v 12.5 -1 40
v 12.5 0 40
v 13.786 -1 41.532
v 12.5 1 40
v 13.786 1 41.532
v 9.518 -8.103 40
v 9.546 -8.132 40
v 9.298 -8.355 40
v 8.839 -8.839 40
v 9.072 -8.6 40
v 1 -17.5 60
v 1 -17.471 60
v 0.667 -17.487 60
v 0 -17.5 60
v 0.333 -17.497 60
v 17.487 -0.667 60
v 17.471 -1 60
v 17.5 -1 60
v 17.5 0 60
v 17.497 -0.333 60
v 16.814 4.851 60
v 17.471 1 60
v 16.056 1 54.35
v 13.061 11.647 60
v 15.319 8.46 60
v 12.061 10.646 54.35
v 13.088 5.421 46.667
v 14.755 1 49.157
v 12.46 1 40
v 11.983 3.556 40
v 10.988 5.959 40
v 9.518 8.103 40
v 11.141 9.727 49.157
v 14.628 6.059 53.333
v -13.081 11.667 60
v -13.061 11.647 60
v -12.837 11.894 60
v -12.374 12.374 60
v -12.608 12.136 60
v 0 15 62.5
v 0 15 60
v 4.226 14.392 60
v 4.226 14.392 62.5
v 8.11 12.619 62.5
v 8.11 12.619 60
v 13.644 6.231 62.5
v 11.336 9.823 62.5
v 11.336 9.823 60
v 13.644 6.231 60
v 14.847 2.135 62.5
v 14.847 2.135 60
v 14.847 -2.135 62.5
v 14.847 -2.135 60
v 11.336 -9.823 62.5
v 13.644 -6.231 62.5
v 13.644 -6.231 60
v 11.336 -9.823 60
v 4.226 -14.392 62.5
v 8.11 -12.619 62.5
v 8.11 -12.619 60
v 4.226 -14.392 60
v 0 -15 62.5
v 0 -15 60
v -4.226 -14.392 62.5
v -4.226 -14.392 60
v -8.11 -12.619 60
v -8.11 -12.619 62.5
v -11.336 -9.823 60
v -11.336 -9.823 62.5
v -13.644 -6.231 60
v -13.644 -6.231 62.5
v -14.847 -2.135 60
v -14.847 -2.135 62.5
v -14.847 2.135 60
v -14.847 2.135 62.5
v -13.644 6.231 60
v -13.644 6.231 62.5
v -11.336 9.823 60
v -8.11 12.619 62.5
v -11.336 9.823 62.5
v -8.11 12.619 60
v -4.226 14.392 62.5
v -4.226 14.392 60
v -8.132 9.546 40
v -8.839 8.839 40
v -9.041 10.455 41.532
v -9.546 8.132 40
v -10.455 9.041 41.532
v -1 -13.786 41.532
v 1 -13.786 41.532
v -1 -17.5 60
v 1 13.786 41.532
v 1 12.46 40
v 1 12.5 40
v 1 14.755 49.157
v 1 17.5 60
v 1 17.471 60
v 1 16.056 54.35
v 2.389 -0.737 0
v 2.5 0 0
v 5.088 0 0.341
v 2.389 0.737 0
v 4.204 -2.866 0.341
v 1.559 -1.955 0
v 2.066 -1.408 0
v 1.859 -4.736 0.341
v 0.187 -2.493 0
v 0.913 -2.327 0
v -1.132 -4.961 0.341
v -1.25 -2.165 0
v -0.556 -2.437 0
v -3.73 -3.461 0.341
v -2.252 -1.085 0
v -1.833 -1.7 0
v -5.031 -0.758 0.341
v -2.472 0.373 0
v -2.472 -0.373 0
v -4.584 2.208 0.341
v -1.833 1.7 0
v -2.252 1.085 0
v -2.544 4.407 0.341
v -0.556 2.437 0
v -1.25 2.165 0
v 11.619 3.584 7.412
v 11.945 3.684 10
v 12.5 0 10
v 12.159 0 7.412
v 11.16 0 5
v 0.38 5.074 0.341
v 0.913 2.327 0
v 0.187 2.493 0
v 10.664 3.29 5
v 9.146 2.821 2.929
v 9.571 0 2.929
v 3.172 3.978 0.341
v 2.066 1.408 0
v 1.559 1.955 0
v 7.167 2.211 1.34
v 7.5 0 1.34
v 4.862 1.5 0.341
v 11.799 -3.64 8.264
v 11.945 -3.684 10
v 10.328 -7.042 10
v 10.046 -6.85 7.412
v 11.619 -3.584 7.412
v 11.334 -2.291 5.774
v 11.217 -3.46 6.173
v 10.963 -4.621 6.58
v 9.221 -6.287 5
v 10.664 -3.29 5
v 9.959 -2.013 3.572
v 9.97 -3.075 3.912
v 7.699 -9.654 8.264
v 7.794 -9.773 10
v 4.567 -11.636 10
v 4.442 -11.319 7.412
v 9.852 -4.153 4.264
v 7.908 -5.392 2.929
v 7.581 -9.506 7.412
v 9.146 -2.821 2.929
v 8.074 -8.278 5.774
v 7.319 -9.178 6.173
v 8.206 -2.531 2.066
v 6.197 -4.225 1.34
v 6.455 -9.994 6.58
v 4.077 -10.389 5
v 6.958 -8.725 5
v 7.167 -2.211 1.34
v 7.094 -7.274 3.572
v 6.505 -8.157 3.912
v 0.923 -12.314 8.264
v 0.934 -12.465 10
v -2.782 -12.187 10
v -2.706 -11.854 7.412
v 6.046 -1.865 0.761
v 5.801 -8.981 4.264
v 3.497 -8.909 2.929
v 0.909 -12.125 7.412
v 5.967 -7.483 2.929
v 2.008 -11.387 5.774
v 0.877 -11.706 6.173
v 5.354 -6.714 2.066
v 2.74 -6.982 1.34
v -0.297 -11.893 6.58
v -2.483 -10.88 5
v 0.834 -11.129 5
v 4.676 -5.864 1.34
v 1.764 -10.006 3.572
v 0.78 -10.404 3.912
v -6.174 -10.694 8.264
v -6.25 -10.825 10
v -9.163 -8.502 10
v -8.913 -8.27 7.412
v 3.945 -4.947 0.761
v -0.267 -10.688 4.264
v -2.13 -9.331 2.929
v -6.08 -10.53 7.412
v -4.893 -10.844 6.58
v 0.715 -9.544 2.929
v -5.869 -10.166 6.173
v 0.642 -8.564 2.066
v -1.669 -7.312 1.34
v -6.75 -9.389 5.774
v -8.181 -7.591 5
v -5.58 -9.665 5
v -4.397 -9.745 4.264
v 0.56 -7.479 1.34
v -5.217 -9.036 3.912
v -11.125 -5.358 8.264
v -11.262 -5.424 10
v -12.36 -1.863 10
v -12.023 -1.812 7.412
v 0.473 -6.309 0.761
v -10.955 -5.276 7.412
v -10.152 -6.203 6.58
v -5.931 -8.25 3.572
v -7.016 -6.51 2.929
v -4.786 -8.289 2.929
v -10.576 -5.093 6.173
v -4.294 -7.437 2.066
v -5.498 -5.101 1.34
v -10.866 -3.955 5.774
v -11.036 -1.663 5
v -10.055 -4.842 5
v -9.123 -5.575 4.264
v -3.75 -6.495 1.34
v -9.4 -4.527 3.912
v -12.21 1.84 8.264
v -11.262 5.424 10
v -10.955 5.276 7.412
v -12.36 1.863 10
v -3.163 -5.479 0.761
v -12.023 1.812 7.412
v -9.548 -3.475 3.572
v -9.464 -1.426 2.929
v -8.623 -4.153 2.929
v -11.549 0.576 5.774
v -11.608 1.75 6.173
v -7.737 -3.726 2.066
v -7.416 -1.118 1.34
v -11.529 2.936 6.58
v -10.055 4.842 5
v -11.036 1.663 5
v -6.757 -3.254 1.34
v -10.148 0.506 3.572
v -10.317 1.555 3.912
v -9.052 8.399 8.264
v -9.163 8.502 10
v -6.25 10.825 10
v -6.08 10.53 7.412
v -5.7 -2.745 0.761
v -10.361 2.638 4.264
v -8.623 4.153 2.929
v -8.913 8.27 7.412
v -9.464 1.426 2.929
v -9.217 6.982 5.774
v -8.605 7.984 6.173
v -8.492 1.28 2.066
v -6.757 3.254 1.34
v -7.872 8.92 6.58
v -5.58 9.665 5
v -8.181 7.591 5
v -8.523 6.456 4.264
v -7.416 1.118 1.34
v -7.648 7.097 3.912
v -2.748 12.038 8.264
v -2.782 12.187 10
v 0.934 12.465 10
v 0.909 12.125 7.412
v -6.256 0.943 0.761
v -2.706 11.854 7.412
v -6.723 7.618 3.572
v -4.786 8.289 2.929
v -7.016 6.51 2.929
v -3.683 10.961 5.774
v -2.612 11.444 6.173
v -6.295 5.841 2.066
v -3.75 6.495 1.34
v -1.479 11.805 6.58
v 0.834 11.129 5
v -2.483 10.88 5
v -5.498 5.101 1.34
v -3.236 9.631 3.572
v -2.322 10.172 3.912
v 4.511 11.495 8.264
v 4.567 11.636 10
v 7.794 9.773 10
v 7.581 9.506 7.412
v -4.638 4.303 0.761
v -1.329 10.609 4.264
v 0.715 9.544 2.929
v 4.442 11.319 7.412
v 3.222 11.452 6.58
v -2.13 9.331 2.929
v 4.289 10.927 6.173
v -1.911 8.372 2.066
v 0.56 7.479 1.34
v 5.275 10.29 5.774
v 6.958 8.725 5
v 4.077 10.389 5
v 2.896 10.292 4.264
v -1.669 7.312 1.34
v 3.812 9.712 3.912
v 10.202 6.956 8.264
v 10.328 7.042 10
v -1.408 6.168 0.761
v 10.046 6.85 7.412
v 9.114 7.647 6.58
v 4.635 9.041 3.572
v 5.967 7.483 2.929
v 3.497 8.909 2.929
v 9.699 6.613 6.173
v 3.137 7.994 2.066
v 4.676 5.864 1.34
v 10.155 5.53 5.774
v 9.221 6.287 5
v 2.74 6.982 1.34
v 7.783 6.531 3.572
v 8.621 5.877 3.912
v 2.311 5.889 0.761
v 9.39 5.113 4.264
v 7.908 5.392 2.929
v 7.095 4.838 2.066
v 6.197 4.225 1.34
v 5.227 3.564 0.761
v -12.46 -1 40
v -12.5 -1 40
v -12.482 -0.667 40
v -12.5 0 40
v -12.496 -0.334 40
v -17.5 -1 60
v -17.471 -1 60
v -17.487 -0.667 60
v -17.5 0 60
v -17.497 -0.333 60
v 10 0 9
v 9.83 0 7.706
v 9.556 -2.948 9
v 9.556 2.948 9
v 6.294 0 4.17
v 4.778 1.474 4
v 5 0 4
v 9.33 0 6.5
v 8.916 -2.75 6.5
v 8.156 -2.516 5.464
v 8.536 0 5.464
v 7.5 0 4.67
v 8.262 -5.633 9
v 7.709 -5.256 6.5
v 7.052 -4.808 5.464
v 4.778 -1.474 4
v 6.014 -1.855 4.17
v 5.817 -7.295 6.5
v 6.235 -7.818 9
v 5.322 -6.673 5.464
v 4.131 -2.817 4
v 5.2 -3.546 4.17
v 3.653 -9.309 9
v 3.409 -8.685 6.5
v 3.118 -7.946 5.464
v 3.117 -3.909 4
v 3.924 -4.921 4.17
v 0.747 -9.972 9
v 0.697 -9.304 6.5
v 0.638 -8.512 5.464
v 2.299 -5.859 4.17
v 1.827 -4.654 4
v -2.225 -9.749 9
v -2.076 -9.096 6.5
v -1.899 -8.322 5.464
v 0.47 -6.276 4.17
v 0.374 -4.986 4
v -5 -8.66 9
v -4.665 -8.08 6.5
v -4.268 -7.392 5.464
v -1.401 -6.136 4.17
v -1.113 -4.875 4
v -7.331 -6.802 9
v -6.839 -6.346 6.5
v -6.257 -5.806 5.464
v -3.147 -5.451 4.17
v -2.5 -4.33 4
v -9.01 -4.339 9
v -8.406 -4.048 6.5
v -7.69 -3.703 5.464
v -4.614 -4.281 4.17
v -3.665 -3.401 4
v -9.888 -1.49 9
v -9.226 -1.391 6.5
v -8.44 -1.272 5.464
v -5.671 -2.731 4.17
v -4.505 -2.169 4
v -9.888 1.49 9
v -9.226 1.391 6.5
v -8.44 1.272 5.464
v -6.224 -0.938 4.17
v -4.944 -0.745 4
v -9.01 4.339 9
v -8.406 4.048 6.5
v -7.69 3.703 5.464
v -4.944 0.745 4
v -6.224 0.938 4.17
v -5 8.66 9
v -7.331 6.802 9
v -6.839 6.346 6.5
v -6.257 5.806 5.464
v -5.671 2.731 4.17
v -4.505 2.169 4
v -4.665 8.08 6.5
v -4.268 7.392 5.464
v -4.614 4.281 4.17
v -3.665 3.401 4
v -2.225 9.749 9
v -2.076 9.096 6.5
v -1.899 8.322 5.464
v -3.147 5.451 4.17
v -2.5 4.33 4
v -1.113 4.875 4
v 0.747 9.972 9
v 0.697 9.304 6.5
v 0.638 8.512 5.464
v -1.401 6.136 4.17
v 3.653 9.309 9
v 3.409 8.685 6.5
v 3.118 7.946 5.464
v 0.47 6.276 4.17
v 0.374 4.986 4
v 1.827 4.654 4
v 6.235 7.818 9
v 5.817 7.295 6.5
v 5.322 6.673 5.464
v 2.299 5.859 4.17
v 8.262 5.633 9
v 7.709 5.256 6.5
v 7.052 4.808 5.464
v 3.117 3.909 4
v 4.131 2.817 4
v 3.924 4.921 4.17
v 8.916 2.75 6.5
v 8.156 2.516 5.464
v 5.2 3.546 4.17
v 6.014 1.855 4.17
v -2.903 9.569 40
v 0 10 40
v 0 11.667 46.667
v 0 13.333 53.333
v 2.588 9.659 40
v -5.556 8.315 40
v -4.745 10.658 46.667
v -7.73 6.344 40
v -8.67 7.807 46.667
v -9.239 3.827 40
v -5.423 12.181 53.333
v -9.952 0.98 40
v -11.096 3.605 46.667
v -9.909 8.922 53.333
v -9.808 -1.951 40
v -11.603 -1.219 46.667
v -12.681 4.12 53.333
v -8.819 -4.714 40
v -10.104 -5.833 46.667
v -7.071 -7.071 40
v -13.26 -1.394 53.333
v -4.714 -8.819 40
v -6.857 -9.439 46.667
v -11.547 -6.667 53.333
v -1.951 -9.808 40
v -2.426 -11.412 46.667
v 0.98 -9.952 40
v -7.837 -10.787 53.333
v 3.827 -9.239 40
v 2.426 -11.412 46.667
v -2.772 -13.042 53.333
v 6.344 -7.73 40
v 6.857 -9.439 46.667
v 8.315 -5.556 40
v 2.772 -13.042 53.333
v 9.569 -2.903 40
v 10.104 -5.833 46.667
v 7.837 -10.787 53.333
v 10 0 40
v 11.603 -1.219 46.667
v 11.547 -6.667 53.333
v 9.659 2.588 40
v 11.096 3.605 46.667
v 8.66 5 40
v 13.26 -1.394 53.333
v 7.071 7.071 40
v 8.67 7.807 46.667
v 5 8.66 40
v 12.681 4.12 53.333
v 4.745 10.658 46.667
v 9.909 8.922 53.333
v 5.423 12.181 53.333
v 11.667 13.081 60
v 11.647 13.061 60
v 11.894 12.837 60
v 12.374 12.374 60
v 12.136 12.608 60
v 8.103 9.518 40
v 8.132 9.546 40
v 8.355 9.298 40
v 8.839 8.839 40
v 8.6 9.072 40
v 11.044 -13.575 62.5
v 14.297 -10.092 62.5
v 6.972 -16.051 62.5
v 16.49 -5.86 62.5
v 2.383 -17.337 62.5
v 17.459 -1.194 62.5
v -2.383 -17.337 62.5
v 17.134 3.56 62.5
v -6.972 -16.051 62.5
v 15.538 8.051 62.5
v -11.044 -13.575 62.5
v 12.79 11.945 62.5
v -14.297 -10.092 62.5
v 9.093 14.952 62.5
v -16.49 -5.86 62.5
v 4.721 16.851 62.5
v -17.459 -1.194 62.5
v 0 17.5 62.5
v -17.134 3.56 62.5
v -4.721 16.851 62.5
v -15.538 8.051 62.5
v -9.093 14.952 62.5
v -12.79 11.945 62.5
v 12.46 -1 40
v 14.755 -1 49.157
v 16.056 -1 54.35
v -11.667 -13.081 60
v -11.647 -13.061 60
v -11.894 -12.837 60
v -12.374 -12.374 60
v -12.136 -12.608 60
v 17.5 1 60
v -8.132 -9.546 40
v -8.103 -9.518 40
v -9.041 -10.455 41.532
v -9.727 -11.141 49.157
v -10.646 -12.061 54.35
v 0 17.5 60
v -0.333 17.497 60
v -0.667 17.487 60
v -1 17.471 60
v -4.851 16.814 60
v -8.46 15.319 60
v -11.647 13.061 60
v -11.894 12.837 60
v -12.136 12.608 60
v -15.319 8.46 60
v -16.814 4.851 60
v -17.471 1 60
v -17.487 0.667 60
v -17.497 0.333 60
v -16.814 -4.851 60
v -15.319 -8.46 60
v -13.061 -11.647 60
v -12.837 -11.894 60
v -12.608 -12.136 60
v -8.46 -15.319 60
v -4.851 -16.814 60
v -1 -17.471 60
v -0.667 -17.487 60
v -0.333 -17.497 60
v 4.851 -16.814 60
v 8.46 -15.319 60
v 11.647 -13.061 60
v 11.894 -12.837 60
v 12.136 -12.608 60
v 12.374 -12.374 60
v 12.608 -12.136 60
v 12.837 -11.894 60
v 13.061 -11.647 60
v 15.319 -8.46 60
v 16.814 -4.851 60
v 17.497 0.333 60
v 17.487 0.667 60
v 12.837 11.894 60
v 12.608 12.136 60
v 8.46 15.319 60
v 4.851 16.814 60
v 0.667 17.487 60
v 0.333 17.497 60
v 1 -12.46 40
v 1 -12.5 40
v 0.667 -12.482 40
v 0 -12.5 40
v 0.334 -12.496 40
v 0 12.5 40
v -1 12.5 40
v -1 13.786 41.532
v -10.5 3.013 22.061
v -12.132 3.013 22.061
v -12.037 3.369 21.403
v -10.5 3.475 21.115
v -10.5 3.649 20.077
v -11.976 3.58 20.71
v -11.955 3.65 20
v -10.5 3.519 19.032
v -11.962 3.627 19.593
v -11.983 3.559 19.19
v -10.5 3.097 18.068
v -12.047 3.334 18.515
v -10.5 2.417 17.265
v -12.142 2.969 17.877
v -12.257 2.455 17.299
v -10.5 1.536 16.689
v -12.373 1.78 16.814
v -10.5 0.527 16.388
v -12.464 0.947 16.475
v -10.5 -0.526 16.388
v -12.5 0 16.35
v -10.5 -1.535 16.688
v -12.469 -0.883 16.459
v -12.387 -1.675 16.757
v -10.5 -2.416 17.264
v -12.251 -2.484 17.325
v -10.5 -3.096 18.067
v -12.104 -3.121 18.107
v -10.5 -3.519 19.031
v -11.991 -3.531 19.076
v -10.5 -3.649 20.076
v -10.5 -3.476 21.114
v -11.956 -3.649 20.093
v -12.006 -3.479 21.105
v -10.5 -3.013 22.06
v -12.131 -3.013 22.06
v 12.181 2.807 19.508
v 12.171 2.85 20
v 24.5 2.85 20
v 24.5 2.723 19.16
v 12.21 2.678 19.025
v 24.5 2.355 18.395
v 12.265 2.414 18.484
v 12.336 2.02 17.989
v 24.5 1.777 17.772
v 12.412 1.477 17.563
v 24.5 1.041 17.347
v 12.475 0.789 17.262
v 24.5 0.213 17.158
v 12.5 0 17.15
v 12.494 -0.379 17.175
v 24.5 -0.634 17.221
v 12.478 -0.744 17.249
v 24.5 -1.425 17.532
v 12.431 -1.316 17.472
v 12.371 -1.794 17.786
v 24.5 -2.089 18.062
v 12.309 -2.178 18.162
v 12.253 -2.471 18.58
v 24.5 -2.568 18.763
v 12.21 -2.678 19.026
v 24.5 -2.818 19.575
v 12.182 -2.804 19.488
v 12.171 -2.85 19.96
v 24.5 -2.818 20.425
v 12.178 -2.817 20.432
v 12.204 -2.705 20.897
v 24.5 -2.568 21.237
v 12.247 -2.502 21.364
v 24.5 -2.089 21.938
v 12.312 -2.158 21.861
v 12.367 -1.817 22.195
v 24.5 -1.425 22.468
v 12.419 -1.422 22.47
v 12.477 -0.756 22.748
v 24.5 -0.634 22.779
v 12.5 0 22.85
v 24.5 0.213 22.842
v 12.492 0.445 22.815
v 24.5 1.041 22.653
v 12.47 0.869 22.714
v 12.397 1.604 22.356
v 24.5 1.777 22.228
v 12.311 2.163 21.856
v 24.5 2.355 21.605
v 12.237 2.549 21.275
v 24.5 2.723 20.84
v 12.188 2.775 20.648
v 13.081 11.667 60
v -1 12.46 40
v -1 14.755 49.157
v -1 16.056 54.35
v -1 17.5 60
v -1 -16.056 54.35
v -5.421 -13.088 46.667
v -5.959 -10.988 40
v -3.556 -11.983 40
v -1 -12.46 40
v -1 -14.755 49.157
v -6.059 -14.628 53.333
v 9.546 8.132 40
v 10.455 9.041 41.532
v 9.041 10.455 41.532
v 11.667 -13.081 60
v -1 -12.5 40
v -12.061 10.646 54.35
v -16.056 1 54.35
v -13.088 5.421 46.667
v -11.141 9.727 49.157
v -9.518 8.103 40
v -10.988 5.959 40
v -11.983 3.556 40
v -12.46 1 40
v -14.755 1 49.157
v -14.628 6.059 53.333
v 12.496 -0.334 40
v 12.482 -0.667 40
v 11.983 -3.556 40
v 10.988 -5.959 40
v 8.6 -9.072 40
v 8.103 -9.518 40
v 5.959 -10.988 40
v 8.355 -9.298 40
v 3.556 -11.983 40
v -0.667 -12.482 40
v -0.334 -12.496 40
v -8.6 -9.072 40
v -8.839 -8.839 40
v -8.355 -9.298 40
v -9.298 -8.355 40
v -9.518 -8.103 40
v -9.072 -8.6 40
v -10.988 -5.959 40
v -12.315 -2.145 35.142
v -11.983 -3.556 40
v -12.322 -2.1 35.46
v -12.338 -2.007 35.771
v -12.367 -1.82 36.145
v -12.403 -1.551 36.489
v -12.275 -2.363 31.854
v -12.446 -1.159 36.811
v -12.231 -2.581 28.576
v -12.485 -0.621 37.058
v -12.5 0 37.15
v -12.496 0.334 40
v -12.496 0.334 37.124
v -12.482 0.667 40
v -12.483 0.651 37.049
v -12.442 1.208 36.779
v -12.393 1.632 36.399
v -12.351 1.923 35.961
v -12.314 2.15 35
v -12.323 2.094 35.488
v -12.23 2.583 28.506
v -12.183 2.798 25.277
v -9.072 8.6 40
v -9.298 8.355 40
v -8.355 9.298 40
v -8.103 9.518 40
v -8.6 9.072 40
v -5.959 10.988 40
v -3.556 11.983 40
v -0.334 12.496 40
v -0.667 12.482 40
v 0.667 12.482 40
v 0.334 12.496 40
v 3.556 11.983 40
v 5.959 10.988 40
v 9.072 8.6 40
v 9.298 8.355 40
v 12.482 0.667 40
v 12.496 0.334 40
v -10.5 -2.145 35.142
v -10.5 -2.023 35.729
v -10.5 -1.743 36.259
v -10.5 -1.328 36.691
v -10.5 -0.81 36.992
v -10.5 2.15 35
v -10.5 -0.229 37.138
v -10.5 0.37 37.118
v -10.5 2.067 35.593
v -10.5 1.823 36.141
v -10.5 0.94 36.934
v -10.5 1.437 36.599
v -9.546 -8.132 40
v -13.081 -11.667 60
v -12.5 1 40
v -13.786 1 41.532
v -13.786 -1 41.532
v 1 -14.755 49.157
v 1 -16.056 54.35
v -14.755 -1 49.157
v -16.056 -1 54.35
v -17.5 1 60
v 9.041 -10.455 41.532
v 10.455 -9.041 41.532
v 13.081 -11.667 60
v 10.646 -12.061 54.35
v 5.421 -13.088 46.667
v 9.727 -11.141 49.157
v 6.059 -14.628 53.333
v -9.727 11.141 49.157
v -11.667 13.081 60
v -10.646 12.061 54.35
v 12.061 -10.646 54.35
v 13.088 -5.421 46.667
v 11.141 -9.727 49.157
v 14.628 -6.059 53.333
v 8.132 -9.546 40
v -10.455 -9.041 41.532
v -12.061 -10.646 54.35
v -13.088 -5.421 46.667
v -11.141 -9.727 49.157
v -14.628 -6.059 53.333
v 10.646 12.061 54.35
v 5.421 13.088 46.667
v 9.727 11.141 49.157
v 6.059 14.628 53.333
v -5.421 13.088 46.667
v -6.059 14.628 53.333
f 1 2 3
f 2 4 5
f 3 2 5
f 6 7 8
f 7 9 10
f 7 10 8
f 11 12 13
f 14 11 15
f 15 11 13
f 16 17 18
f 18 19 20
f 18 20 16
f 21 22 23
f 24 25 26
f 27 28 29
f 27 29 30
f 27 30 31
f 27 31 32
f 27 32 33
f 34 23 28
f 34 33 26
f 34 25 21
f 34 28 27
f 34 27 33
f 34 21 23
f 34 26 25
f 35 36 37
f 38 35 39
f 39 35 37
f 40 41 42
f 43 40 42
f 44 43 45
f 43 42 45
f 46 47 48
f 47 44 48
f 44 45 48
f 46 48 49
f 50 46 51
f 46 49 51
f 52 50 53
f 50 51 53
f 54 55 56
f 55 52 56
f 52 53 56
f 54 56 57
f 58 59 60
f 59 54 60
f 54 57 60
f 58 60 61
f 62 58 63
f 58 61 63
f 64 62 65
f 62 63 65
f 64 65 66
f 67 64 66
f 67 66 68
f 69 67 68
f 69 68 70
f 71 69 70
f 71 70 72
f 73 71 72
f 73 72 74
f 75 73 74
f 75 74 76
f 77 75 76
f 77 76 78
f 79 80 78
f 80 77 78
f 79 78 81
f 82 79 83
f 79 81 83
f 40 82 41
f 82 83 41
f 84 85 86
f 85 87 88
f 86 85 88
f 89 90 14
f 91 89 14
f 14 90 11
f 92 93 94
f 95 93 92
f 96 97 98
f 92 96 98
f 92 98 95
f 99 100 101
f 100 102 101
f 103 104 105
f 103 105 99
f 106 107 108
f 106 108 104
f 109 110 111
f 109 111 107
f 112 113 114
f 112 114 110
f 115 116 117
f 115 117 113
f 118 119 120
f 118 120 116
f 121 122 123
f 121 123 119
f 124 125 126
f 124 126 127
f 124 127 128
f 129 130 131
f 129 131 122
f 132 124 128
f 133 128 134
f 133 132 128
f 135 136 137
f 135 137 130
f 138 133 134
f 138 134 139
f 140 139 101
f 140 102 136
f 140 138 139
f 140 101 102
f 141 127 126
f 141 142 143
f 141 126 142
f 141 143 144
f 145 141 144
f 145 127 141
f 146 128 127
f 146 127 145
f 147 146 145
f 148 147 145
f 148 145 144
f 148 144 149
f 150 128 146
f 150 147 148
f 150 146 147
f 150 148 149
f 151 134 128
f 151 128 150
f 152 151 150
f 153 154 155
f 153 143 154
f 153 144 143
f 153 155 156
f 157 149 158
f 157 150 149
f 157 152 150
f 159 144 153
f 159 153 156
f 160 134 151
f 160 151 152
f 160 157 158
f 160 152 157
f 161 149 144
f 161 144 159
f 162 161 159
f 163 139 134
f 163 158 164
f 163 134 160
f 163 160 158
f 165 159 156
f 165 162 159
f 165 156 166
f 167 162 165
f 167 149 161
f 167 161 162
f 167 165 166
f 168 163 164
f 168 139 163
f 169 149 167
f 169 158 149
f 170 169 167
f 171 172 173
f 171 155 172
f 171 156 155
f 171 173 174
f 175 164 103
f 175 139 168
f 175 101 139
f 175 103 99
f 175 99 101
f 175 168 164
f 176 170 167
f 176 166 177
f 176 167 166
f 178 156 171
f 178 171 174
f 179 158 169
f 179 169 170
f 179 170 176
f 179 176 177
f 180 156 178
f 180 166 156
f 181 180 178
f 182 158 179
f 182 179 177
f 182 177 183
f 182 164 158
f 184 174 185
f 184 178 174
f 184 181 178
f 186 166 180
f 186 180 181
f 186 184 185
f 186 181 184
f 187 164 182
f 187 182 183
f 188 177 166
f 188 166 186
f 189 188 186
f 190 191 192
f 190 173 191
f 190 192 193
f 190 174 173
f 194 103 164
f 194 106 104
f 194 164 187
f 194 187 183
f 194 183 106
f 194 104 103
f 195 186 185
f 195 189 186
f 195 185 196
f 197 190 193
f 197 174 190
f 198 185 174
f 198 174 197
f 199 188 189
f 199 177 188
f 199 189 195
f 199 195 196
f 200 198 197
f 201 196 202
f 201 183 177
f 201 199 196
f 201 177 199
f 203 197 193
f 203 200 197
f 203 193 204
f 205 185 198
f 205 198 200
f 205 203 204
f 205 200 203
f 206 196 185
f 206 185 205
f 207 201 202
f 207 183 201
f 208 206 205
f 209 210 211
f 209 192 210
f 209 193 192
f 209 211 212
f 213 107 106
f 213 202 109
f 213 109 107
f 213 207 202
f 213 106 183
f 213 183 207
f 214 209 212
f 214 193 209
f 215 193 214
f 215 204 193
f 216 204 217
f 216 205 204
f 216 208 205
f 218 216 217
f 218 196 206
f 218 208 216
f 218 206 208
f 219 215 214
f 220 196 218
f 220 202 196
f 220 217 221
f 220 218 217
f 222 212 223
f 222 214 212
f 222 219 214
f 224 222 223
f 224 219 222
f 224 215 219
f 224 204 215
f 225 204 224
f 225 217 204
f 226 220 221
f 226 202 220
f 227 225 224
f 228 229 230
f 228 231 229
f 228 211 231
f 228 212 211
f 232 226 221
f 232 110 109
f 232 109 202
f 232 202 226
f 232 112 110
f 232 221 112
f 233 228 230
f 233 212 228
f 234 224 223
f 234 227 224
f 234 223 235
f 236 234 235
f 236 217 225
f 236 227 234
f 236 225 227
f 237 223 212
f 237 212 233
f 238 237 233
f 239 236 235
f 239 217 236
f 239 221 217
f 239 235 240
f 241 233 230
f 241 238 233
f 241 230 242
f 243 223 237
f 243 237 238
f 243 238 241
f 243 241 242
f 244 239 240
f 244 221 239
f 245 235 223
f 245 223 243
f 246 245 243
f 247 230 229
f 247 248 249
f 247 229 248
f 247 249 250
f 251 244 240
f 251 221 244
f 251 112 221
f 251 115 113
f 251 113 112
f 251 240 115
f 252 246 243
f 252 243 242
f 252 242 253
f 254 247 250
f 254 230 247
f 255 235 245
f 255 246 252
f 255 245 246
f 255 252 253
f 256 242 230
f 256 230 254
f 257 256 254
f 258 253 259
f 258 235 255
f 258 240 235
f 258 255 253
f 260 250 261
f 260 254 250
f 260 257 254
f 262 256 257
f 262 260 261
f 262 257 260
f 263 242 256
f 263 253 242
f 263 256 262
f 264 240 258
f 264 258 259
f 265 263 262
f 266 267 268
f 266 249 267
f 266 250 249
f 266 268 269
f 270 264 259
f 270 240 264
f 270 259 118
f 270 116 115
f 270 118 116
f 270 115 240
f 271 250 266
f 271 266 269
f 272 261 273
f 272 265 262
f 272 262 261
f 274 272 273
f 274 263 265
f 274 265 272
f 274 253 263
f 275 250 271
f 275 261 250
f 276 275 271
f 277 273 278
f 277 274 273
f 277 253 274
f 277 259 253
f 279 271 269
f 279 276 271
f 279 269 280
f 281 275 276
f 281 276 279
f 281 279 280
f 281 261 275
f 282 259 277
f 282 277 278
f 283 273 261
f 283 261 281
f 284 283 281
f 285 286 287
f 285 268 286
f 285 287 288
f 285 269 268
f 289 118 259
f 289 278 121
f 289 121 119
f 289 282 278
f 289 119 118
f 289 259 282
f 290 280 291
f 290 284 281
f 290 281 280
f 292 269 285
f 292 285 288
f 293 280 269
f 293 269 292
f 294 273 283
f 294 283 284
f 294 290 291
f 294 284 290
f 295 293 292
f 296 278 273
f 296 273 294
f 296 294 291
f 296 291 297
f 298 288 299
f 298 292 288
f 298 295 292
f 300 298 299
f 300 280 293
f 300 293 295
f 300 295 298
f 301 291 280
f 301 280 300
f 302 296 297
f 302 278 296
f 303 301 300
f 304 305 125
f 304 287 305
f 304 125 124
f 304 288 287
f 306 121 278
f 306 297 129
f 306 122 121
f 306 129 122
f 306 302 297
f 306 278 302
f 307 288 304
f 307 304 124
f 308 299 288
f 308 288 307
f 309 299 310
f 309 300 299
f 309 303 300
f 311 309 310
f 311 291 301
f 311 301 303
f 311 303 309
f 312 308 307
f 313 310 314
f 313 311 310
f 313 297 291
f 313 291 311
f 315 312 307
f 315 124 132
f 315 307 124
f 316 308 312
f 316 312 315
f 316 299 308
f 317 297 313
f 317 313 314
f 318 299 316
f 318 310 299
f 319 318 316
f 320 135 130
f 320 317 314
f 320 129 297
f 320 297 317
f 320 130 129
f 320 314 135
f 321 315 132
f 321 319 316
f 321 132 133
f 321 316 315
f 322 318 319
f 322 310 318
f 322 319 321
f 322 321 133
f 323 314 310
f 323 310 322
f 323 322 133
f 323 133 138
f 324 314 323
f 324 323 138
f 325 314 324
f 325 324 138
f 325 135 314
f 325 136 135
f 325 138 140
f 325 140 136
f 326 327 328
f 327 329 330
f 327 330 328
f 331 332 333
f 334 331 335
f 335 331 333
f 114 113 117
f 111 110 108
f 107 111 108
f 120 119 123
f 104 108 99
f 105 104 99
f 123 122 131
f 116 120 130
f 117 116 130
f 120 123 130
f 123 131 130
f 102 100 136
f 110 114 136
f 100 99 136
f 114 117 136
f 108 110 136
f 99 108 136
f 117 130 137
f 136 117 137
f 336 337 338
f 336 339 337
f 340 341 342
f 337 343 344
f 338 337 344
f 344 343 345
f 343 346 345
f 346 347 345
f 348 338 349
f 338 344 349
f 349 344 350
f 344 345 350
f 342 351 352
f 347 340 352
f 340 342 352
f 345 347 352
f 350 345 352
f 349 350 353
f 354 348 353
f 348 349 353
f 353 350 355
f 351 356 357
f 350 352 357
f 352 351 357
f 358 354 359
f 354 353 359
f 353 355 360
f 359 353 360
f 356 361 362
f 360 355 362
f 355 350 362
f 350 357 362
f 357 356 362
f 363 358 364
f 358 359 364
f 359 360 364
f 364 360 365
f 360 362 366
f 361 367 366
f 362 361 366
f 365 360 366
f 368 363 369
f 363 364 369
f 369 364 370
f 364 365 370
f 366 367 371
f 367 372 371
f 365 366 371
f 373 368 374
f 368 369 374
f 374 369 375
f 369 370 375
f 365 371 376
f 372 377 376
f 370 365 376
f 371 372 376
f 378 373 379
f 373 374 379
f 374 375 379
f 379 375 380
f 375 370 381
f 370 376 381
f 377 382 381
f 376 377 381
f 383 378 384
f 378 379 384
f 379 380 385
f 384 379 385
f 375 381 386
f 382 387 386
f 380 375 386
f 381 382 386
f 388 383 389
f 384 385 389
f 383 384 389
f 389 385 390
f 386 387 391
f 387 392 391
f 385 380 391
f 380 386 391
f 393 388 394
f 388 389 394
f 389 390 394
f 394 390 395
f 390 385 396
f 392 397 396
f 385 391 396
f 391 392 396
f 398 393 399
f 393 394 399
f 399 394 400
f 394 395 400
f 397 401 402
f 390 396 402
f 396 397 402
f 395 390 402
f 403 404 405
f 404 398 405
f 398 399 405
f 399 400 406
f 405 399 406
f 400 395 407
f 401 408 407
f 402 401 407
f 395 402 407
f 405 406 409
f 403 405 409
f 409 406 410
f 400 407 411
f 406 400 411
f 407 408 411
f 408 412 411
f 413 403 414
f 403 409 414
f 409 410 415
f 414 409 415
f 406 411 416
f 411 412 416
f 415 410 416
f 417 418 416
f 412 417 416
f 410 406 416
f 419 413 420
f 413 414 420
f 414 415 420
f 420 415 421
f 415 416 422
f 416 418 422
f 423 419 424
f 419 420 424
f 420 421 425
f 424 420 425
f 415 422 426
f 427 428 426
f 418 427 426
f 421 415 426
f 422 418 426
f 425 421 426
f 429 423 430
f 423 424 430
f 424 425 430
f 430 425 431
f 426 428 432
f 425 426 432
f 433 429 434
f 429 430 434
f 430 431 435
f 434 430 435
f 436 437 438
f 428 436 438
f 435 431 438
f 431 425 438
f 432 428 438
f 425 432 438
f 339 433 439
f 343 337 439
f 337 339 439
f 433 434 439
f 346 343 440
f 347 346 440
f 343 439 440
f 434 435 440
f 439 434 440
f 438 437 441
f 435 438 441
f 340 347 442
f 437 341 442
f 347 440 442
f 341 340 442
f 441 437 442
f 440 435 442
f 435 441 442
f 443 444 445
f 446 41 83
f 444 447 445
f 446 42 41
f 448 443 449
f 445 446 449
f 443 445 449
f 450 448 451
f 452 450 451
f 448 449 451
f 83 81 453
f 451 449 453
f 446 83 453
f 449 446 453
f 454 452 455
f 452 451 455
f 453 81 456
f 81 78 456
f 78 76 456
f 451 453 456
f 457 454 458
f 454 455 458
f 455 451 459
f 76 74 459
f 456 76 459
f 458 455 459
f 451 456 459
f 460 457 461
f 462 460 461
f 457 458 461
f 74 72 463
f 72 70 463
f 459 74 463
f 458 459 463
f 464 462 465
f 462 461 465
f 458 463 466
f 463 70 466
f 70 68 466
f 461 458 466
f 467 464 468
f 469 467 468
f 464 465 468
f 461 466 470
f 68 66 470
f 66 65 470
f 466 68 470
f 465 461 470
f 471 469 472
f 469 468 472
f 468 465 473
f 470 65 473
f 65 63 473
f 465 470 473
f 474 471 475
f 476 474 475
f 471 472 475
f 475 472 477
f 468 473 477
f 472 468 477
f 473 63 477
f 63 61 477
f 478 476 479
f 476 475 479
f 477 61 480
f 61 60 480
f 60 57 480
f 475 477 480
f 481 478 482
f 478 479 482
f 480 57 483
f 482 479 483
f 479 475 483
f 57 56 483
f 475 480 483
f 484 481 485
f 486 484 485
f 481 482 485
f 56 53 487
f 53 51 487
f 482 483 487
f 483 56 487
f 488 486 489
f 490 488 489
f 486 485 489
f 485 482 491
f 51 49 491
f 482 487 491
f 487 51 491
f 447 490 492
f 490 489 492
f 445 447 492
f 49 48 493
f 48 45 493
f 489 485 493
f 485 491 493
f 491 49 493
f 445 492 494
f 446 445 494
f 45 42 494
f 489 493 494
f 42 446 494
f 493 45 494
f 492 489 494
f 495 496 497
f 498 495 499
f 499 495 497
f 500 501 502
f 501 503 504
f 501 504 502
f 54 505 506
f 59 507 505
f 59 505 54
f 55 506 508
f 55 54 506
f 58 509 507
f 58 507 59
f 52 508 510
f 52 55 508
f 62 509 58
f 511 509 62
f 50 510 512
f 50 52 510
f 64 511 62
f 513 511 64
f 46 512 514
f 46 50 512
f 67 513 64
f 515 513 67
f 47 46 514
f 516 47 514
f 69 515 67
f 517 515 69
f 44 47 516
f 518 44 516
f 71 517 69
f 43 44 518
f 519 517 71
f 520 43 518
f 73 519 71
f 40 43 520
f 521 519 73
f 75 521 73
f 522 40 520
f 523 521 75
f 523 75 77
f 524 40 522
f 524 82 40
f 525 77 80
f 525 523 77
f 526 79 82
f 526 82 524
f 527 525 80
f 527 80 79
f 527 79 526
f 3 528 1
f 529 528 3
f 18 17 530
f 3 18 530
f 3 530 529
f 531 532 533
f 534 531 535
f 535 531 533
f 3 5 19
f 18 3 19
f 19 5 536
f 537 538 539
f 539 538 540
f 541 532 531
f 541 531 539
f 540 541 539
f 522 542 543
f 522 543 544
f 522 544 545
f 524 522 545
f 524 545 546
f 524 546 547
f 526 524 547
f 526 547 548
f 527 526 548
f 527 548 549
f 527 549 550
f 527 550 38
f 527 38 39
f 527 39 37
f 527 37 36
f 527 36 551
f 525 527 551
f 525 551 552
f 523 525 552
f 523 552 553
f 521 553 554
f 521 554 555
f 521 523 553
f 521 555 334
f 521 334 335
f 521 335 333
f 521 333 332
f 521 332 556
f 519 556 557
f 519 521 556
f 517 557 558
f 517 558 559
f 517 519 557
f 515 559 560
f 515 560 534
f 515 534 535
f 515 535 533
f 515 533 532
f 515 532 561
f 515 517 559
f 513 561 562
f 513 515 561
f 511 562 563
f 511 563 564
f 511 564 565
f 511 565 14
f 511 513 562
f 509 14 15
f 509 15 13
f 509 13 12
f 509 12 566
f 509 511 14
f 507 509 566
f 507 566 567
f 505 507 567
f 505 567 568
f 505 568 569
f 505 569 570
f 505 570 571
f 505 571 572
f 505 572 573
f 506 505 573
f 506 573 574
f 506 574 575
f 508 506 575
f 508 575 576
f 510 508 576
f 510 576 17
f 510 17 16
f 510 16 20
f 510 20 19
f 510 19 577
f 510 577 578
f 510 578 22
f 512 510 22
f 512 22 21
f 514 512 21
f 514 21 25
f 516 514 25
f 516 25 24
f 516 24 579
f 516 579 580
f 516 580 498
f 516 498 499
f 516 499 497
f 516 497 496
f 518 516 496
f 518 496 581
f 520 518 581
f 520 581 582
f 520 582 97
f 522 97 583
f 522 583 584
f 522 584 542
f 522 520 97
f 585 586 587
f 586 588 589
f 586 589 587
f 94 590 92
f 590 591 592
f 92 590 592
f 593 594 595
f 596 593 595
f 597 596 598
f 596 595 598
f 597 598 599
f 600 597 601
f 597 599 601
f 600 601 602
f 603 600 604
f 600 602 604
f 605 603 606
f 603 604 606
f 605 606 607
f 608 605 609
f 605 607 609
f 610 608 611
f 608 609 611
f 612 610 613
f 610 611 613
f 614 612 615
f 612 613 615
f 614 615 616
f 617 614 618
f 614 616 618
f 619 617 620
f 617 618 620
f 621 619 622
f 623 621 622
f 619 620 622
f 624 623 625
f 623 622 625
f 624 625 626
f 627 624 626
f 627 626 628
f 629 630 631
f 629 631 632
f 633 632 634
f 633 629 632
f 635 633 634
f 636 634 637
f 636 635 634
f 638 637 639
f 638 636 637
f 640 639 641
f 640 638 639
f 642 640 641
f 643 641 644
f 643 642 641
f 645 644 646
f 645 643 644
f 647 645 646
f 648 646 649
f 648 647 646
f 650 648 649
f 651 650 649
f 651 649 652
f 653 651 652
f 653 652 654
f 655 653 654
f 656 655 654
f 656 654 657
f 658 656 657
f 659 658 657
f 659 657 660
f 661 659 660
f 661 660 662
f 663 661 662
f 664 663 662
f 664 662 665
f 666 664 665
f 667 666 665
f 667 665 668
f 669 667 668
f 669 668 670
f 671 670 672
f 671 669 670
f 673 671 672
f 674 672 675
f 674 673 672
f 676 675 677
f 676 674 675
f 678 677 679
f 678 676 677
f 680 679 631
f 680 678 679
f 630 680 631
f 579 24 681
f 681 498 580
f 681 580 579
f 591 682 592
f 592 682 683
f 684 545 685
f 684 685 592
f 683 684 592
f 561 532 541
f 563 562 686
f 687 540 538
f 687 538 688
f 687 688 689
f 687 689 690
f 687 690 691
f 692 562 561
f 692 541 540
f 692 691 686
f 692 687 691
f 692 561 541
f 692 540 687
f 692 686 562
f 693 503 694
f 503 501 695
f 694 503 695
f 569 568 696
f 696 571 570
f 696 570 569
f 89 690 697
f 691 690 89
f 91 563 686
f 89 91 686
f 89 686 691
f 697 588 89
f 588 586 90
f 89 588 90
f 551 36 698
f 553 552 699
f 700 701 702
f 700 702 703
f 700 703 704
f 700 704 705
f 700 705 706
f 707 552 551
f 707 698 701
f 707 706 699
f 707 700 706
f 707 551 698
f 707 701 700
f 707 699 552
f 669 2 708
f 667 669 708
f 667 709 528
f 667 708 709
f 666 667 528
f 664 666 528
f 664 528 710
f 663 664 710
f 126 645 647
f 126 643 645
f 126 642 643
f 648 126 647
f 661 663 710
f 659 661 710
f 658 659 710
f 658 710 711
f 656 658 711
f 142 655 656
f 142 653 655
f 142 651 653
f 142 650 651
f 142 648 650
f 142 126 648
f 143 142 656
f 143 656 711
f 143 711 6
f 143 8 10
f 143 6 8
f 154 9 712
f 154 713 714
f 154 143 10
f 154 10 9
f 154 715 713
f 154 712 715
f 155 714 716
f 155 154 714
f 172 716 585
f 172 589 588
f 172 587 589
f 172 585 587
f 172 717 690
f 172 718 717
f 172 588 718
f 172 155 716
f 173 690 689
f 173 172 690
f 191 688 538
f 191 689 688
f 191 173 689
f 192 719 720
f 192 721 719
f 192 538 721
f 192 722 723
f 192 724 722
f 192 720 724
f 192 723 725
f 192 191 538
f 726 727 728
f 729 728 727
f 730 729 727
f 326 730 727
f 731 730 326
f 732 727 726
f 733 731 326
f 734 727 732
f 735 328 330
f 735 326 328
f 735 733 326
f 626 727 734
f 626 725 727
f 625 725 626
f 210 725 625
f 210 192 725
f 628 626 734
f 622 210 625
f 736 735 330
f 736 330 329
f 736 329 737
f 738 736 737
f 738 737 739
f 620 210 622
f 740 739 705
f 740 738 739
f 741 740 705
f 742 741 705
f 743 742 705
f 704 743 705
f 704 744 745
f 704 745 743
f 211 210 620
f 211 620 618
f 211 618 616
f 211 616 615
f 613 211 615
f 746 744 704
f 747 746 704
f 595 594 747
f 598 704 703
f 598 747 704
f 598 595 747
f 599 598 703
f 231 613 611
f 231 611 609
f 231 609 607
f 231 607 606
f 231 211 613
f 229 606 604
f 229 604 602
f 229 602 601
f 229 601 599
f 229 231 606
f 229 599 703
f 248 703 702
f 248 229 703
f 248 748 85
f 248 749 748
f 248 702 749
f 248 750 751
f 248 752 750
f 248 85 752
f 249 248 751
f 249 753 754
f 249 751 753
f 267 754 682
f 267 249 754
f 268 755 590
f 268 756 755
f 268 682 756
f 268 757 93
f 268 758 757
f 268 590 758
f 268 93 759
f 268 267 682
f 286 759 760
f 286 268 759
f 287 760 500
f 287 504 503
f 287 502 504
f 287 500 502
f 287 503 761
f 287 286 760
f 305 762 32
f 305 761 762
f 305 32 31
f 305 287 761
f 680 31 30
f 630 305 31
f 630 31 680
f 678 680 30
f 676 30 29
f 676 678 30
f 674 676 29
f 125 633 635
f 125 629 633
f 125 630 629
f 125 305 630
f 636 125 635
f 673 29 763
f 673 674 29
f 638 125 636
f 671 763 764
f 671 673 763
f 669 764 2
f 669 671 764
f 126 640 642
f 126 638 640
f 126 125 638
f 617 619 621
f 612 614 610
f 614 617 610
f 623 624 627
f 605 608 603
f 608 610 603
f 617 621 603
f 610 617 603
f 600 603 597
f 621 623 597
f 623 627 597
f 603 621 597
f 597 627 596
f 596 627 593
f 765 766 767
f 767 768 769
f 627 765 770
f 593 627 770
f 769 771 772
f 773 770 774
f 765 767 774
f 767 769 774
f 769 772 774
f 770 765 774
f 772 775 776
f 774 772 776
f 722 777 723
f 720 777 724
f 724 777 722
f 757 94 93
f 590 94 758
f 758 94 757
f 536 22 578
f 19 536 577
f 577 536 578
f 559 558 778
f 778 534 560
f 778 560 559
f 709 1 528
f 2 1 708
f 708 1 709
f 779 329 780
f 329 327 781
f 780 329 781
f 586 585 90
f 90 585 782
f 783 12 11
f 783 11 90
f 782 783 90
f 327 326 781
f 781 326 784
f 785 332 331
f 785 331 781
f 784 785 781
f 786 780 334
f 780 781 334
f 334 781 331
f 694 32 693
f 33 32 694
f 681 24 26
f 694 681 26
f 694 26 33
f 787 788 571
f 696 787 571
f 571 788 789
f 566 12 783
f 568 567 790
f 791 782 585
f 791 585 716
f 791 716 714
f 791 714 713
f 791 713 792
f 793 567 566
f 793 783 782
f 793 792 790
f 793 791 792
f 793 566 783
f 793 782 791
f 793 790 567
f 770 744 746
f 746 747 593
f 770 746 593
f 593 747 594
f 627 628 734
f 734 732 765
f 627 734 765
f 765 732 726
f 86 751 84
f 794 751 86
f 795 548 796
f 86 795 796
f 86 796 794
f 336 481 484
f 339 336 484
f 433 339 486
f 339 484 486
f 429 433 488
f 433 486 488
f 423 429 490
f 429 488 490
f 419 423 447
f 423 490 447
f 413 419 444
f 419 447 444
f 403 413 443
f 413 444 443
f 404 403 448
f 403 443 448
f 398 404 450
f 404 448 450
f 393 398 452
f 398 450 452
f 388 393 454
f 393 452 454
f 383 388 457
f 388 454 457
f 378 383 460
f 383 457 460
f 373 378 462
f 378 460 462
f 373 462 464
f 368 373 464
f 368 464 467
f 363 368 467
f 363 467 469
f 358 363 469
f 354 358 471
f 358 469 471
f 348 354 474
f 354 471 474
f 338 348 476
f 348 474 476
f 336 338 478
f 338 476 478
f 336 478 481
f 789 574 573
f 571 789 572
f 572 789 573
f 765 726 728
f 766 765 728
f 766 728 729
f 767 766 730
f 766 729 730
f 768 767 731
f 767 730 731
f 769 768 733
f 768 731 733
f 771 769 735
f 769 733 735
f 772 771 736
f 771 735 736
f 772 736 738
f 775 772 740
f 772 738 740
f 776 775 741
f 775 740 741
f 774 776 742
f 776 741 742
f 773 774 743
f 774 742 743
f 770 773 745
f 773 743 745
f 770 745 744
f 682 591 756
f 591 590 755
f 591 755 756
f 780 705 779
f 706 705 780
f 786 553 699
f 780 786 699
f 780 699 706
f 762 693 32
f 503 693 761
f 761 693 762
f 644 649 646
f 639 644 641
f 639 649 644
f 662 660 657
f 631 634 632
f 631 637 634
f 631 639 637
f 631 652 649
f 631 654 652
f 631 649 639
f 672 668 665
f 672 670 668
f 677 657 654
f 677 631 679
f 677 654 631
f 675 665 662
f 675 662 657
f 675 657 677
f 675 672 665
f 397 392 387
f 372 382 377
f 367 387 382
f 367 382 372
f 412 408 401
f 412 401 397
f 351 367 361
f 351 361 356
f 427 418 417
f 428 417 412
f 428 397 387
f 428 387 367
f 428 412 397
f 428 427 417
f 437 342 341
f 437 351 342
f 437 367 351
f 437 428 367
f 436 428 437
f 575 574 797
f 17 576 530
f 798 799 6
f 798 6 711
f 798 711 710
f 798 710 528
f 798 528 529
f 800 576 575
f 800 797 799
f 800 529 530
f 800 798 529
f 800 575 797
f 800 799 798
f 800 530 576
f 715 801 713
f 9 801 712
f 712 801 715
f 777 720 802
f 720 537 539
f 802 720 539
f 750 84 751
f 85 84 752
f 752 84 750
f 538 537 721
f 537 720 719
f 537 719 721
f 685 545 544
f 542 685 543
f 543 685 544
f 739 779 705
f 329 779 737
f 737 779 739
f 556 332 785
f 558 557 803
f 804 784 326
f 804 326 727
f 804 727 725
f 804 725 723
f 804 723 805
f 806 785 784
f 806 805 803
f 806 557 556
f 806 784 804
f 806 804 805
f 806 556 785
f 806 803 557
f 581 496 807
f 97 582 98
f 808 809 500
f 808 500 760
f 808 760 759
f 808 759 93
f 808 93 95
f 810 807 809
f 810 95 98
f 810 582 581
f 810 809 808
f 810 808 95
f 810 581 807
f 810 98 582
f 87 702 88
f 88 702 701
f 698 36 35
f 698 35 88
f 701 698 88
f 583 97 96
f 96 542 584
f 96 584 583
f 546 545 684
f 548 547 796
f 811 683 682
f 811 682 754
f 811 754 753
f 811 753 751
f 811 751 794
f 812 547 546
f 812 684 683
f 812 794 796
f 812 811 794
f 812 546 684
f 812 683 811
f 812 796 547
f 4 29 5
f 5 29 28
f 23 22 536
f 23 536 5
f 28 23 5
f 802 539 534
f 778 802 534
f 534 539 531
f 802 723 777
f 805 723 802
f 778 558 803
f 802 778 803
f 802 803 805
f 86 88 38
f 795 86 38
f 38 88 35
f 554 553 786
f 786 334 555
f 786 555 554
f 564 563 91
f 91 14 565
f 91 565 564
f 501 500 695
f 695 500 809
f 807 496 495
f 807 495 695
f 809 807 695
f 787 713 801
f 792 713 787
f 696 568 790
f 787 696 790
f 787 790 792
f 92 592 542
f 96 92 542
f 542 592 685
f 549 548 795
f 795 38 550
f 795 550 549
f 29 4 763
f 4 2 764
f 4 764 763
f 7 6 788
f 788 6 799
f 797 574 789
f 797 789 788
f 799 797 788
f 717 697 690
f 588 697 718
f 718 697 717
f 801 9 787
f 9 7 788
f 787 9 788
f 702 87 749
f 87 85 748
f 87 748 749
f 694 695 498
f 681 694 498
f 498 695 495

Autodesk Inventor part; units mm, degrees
ref_plane "XZ Plane" through (0, 0, 0) normal (0, 1, 0) x (-1, 0, 0)
sketch "Sketch19" plane through (0, 0, 0) normal (0, 0, 1) x (1, 0, 0)
  circle A0 centre (0, 0) radius 12.5
  dimension "d130" = 25
extrude "Extrusion17" add sketch "Sketch19" along normal blind 40
sketch "Sketch20" plane through (0, 0, 40) normal (0, 0, 1) x (1, 0, 0)
  circle A0 centre (0, 0) radius 10
  dimension "d133" = 20
fillet "Fillet6" radius 10 1 edges at (-12.5, 0, 0)
extrude "Extrusion18" cut sketch "Sketch20" against normal blind 36
ref_plane "Work Plane3" through (10, 0, 0) normal (1, 0, 0) x (0, 1, 0)
sketch "Sketch21" plane through (10, 0, 0) normal (1, 0, 0) x (0, 1, 0)
  line L0 (0, 0) -> (0, 20)
  circle A0 centre (0, 20) radius 2.85
  dimension "d138" = 20
  dimension "d139" = 5.7
extrude "Extrusion19" add sketch "Sketch21" along normal blind 14.5
sketch "Sketch26" plane through (0, 0, 0) normal (1, 0, 0) x (0, 1, 0)
  line L0 (-10, 40) -> (10, 40) projected
  line L1 (12.5, 40) -> (-12.5, 40) projected
  line L2 (10, 40) -> (12.5, 40)
  line L3 (17.5, 60) -> (12.5, 40)
  line L4 (17.5, 60) -> (17.5, 62.5)
  line L5 (17.5, 62.5) -> (15, 62.5)
  line L6 (15, 62.5) -> (15, 60)
  line L7 (10, 40) -> (15, 60)
  line L8 (0, -10.5) -> (0, 63) projected
  point P0 (0, 0)
  dimension "d147" = 2.5
  dimension "d148" = 2.5
revolve "Revolution1" add sketch "Sketch26" angle 360 about axis through (0, 0, -10) along (0, 0, 1)
sketch "Sketch27" plane through (0, 0, 0) normal (1, 0, 0) x (0, 1, 0)
  line L0 (12.5, 40) -> (13.7856, 41.5321)
  line L1 (12.5, 40) -> (14.5, 40) construction
  line L2 (13.7856, 41.5321) -> (17.5, 60)
  line L3 (12.5, 40) -> (-12.5, 40) projected
  line L4 (12.5, 40) -> (11.5, 40)
  line L5 (-17.5, 60) -> (17.5, 60) projected
  line L6 (17.5, 60) -> (16.5, 60)
  line L7 (16.5, 60) -> (11.5, 40)
  point P0 (0, 0)
  dimension "d150" = 2
  dimension "d151" = 50
  dimension "d152" = 1
  dimension "d153" = 1
extrude "Extrusion21" add sketch "Sketch27" along normal mid plane 2
pattern_circular "Circular Pattern2" count 8 over 360 about axis through (0, 0, -10) along (0, 0, 1) of "Extrusion21"
fillet "Fillet7" radius 5 1 edges at (-10, 0, 4)
ref_plane "Work Plane5" through (-12.5, 0, 0) normal (1, 0, 0) x (0, 1, 0)
sketch "Sketch30" plane through (-12.5, 0, 0) normal (1, 0, 0) x (0, 1, 0)
  circle A0 centre (0, 20) radius 2.85 projected
  line L0 (0, 0) -> (0, 20)
  circle A1 centre (0, 20) radius 3.65
  line L1 (0, 20) -> (0, 35)
  circle A2 centre (0, 35) radius 2.15
  line L2 (0, 20) -> (-3.15, 20)
  line L3 (-3.15, 20) -> (3.15, 20)
  line L4 (2.15, 35) -> (3.15, 20)
  line L5 (-3.15, 20) -> (-2.1453, 35.1423)
  point P0 (2.9808, 20.3389)
  point P1 (-2.9809, 20.3376)
  point P2 (3.0126, 22.0607)
  point P3 (-3.0133, 22.0597)
  dimension "d166" = 7.3
  dimension "d167" = 15
  dimension "d168" = 4.3
  dimension "d169" = 3.15
  dimension "d170" = 6.3
extrude "Extrusion27" cut sketch "Sketch30" along normal blind 2
properties part number "Waterkanon poging 3" material "S235"
